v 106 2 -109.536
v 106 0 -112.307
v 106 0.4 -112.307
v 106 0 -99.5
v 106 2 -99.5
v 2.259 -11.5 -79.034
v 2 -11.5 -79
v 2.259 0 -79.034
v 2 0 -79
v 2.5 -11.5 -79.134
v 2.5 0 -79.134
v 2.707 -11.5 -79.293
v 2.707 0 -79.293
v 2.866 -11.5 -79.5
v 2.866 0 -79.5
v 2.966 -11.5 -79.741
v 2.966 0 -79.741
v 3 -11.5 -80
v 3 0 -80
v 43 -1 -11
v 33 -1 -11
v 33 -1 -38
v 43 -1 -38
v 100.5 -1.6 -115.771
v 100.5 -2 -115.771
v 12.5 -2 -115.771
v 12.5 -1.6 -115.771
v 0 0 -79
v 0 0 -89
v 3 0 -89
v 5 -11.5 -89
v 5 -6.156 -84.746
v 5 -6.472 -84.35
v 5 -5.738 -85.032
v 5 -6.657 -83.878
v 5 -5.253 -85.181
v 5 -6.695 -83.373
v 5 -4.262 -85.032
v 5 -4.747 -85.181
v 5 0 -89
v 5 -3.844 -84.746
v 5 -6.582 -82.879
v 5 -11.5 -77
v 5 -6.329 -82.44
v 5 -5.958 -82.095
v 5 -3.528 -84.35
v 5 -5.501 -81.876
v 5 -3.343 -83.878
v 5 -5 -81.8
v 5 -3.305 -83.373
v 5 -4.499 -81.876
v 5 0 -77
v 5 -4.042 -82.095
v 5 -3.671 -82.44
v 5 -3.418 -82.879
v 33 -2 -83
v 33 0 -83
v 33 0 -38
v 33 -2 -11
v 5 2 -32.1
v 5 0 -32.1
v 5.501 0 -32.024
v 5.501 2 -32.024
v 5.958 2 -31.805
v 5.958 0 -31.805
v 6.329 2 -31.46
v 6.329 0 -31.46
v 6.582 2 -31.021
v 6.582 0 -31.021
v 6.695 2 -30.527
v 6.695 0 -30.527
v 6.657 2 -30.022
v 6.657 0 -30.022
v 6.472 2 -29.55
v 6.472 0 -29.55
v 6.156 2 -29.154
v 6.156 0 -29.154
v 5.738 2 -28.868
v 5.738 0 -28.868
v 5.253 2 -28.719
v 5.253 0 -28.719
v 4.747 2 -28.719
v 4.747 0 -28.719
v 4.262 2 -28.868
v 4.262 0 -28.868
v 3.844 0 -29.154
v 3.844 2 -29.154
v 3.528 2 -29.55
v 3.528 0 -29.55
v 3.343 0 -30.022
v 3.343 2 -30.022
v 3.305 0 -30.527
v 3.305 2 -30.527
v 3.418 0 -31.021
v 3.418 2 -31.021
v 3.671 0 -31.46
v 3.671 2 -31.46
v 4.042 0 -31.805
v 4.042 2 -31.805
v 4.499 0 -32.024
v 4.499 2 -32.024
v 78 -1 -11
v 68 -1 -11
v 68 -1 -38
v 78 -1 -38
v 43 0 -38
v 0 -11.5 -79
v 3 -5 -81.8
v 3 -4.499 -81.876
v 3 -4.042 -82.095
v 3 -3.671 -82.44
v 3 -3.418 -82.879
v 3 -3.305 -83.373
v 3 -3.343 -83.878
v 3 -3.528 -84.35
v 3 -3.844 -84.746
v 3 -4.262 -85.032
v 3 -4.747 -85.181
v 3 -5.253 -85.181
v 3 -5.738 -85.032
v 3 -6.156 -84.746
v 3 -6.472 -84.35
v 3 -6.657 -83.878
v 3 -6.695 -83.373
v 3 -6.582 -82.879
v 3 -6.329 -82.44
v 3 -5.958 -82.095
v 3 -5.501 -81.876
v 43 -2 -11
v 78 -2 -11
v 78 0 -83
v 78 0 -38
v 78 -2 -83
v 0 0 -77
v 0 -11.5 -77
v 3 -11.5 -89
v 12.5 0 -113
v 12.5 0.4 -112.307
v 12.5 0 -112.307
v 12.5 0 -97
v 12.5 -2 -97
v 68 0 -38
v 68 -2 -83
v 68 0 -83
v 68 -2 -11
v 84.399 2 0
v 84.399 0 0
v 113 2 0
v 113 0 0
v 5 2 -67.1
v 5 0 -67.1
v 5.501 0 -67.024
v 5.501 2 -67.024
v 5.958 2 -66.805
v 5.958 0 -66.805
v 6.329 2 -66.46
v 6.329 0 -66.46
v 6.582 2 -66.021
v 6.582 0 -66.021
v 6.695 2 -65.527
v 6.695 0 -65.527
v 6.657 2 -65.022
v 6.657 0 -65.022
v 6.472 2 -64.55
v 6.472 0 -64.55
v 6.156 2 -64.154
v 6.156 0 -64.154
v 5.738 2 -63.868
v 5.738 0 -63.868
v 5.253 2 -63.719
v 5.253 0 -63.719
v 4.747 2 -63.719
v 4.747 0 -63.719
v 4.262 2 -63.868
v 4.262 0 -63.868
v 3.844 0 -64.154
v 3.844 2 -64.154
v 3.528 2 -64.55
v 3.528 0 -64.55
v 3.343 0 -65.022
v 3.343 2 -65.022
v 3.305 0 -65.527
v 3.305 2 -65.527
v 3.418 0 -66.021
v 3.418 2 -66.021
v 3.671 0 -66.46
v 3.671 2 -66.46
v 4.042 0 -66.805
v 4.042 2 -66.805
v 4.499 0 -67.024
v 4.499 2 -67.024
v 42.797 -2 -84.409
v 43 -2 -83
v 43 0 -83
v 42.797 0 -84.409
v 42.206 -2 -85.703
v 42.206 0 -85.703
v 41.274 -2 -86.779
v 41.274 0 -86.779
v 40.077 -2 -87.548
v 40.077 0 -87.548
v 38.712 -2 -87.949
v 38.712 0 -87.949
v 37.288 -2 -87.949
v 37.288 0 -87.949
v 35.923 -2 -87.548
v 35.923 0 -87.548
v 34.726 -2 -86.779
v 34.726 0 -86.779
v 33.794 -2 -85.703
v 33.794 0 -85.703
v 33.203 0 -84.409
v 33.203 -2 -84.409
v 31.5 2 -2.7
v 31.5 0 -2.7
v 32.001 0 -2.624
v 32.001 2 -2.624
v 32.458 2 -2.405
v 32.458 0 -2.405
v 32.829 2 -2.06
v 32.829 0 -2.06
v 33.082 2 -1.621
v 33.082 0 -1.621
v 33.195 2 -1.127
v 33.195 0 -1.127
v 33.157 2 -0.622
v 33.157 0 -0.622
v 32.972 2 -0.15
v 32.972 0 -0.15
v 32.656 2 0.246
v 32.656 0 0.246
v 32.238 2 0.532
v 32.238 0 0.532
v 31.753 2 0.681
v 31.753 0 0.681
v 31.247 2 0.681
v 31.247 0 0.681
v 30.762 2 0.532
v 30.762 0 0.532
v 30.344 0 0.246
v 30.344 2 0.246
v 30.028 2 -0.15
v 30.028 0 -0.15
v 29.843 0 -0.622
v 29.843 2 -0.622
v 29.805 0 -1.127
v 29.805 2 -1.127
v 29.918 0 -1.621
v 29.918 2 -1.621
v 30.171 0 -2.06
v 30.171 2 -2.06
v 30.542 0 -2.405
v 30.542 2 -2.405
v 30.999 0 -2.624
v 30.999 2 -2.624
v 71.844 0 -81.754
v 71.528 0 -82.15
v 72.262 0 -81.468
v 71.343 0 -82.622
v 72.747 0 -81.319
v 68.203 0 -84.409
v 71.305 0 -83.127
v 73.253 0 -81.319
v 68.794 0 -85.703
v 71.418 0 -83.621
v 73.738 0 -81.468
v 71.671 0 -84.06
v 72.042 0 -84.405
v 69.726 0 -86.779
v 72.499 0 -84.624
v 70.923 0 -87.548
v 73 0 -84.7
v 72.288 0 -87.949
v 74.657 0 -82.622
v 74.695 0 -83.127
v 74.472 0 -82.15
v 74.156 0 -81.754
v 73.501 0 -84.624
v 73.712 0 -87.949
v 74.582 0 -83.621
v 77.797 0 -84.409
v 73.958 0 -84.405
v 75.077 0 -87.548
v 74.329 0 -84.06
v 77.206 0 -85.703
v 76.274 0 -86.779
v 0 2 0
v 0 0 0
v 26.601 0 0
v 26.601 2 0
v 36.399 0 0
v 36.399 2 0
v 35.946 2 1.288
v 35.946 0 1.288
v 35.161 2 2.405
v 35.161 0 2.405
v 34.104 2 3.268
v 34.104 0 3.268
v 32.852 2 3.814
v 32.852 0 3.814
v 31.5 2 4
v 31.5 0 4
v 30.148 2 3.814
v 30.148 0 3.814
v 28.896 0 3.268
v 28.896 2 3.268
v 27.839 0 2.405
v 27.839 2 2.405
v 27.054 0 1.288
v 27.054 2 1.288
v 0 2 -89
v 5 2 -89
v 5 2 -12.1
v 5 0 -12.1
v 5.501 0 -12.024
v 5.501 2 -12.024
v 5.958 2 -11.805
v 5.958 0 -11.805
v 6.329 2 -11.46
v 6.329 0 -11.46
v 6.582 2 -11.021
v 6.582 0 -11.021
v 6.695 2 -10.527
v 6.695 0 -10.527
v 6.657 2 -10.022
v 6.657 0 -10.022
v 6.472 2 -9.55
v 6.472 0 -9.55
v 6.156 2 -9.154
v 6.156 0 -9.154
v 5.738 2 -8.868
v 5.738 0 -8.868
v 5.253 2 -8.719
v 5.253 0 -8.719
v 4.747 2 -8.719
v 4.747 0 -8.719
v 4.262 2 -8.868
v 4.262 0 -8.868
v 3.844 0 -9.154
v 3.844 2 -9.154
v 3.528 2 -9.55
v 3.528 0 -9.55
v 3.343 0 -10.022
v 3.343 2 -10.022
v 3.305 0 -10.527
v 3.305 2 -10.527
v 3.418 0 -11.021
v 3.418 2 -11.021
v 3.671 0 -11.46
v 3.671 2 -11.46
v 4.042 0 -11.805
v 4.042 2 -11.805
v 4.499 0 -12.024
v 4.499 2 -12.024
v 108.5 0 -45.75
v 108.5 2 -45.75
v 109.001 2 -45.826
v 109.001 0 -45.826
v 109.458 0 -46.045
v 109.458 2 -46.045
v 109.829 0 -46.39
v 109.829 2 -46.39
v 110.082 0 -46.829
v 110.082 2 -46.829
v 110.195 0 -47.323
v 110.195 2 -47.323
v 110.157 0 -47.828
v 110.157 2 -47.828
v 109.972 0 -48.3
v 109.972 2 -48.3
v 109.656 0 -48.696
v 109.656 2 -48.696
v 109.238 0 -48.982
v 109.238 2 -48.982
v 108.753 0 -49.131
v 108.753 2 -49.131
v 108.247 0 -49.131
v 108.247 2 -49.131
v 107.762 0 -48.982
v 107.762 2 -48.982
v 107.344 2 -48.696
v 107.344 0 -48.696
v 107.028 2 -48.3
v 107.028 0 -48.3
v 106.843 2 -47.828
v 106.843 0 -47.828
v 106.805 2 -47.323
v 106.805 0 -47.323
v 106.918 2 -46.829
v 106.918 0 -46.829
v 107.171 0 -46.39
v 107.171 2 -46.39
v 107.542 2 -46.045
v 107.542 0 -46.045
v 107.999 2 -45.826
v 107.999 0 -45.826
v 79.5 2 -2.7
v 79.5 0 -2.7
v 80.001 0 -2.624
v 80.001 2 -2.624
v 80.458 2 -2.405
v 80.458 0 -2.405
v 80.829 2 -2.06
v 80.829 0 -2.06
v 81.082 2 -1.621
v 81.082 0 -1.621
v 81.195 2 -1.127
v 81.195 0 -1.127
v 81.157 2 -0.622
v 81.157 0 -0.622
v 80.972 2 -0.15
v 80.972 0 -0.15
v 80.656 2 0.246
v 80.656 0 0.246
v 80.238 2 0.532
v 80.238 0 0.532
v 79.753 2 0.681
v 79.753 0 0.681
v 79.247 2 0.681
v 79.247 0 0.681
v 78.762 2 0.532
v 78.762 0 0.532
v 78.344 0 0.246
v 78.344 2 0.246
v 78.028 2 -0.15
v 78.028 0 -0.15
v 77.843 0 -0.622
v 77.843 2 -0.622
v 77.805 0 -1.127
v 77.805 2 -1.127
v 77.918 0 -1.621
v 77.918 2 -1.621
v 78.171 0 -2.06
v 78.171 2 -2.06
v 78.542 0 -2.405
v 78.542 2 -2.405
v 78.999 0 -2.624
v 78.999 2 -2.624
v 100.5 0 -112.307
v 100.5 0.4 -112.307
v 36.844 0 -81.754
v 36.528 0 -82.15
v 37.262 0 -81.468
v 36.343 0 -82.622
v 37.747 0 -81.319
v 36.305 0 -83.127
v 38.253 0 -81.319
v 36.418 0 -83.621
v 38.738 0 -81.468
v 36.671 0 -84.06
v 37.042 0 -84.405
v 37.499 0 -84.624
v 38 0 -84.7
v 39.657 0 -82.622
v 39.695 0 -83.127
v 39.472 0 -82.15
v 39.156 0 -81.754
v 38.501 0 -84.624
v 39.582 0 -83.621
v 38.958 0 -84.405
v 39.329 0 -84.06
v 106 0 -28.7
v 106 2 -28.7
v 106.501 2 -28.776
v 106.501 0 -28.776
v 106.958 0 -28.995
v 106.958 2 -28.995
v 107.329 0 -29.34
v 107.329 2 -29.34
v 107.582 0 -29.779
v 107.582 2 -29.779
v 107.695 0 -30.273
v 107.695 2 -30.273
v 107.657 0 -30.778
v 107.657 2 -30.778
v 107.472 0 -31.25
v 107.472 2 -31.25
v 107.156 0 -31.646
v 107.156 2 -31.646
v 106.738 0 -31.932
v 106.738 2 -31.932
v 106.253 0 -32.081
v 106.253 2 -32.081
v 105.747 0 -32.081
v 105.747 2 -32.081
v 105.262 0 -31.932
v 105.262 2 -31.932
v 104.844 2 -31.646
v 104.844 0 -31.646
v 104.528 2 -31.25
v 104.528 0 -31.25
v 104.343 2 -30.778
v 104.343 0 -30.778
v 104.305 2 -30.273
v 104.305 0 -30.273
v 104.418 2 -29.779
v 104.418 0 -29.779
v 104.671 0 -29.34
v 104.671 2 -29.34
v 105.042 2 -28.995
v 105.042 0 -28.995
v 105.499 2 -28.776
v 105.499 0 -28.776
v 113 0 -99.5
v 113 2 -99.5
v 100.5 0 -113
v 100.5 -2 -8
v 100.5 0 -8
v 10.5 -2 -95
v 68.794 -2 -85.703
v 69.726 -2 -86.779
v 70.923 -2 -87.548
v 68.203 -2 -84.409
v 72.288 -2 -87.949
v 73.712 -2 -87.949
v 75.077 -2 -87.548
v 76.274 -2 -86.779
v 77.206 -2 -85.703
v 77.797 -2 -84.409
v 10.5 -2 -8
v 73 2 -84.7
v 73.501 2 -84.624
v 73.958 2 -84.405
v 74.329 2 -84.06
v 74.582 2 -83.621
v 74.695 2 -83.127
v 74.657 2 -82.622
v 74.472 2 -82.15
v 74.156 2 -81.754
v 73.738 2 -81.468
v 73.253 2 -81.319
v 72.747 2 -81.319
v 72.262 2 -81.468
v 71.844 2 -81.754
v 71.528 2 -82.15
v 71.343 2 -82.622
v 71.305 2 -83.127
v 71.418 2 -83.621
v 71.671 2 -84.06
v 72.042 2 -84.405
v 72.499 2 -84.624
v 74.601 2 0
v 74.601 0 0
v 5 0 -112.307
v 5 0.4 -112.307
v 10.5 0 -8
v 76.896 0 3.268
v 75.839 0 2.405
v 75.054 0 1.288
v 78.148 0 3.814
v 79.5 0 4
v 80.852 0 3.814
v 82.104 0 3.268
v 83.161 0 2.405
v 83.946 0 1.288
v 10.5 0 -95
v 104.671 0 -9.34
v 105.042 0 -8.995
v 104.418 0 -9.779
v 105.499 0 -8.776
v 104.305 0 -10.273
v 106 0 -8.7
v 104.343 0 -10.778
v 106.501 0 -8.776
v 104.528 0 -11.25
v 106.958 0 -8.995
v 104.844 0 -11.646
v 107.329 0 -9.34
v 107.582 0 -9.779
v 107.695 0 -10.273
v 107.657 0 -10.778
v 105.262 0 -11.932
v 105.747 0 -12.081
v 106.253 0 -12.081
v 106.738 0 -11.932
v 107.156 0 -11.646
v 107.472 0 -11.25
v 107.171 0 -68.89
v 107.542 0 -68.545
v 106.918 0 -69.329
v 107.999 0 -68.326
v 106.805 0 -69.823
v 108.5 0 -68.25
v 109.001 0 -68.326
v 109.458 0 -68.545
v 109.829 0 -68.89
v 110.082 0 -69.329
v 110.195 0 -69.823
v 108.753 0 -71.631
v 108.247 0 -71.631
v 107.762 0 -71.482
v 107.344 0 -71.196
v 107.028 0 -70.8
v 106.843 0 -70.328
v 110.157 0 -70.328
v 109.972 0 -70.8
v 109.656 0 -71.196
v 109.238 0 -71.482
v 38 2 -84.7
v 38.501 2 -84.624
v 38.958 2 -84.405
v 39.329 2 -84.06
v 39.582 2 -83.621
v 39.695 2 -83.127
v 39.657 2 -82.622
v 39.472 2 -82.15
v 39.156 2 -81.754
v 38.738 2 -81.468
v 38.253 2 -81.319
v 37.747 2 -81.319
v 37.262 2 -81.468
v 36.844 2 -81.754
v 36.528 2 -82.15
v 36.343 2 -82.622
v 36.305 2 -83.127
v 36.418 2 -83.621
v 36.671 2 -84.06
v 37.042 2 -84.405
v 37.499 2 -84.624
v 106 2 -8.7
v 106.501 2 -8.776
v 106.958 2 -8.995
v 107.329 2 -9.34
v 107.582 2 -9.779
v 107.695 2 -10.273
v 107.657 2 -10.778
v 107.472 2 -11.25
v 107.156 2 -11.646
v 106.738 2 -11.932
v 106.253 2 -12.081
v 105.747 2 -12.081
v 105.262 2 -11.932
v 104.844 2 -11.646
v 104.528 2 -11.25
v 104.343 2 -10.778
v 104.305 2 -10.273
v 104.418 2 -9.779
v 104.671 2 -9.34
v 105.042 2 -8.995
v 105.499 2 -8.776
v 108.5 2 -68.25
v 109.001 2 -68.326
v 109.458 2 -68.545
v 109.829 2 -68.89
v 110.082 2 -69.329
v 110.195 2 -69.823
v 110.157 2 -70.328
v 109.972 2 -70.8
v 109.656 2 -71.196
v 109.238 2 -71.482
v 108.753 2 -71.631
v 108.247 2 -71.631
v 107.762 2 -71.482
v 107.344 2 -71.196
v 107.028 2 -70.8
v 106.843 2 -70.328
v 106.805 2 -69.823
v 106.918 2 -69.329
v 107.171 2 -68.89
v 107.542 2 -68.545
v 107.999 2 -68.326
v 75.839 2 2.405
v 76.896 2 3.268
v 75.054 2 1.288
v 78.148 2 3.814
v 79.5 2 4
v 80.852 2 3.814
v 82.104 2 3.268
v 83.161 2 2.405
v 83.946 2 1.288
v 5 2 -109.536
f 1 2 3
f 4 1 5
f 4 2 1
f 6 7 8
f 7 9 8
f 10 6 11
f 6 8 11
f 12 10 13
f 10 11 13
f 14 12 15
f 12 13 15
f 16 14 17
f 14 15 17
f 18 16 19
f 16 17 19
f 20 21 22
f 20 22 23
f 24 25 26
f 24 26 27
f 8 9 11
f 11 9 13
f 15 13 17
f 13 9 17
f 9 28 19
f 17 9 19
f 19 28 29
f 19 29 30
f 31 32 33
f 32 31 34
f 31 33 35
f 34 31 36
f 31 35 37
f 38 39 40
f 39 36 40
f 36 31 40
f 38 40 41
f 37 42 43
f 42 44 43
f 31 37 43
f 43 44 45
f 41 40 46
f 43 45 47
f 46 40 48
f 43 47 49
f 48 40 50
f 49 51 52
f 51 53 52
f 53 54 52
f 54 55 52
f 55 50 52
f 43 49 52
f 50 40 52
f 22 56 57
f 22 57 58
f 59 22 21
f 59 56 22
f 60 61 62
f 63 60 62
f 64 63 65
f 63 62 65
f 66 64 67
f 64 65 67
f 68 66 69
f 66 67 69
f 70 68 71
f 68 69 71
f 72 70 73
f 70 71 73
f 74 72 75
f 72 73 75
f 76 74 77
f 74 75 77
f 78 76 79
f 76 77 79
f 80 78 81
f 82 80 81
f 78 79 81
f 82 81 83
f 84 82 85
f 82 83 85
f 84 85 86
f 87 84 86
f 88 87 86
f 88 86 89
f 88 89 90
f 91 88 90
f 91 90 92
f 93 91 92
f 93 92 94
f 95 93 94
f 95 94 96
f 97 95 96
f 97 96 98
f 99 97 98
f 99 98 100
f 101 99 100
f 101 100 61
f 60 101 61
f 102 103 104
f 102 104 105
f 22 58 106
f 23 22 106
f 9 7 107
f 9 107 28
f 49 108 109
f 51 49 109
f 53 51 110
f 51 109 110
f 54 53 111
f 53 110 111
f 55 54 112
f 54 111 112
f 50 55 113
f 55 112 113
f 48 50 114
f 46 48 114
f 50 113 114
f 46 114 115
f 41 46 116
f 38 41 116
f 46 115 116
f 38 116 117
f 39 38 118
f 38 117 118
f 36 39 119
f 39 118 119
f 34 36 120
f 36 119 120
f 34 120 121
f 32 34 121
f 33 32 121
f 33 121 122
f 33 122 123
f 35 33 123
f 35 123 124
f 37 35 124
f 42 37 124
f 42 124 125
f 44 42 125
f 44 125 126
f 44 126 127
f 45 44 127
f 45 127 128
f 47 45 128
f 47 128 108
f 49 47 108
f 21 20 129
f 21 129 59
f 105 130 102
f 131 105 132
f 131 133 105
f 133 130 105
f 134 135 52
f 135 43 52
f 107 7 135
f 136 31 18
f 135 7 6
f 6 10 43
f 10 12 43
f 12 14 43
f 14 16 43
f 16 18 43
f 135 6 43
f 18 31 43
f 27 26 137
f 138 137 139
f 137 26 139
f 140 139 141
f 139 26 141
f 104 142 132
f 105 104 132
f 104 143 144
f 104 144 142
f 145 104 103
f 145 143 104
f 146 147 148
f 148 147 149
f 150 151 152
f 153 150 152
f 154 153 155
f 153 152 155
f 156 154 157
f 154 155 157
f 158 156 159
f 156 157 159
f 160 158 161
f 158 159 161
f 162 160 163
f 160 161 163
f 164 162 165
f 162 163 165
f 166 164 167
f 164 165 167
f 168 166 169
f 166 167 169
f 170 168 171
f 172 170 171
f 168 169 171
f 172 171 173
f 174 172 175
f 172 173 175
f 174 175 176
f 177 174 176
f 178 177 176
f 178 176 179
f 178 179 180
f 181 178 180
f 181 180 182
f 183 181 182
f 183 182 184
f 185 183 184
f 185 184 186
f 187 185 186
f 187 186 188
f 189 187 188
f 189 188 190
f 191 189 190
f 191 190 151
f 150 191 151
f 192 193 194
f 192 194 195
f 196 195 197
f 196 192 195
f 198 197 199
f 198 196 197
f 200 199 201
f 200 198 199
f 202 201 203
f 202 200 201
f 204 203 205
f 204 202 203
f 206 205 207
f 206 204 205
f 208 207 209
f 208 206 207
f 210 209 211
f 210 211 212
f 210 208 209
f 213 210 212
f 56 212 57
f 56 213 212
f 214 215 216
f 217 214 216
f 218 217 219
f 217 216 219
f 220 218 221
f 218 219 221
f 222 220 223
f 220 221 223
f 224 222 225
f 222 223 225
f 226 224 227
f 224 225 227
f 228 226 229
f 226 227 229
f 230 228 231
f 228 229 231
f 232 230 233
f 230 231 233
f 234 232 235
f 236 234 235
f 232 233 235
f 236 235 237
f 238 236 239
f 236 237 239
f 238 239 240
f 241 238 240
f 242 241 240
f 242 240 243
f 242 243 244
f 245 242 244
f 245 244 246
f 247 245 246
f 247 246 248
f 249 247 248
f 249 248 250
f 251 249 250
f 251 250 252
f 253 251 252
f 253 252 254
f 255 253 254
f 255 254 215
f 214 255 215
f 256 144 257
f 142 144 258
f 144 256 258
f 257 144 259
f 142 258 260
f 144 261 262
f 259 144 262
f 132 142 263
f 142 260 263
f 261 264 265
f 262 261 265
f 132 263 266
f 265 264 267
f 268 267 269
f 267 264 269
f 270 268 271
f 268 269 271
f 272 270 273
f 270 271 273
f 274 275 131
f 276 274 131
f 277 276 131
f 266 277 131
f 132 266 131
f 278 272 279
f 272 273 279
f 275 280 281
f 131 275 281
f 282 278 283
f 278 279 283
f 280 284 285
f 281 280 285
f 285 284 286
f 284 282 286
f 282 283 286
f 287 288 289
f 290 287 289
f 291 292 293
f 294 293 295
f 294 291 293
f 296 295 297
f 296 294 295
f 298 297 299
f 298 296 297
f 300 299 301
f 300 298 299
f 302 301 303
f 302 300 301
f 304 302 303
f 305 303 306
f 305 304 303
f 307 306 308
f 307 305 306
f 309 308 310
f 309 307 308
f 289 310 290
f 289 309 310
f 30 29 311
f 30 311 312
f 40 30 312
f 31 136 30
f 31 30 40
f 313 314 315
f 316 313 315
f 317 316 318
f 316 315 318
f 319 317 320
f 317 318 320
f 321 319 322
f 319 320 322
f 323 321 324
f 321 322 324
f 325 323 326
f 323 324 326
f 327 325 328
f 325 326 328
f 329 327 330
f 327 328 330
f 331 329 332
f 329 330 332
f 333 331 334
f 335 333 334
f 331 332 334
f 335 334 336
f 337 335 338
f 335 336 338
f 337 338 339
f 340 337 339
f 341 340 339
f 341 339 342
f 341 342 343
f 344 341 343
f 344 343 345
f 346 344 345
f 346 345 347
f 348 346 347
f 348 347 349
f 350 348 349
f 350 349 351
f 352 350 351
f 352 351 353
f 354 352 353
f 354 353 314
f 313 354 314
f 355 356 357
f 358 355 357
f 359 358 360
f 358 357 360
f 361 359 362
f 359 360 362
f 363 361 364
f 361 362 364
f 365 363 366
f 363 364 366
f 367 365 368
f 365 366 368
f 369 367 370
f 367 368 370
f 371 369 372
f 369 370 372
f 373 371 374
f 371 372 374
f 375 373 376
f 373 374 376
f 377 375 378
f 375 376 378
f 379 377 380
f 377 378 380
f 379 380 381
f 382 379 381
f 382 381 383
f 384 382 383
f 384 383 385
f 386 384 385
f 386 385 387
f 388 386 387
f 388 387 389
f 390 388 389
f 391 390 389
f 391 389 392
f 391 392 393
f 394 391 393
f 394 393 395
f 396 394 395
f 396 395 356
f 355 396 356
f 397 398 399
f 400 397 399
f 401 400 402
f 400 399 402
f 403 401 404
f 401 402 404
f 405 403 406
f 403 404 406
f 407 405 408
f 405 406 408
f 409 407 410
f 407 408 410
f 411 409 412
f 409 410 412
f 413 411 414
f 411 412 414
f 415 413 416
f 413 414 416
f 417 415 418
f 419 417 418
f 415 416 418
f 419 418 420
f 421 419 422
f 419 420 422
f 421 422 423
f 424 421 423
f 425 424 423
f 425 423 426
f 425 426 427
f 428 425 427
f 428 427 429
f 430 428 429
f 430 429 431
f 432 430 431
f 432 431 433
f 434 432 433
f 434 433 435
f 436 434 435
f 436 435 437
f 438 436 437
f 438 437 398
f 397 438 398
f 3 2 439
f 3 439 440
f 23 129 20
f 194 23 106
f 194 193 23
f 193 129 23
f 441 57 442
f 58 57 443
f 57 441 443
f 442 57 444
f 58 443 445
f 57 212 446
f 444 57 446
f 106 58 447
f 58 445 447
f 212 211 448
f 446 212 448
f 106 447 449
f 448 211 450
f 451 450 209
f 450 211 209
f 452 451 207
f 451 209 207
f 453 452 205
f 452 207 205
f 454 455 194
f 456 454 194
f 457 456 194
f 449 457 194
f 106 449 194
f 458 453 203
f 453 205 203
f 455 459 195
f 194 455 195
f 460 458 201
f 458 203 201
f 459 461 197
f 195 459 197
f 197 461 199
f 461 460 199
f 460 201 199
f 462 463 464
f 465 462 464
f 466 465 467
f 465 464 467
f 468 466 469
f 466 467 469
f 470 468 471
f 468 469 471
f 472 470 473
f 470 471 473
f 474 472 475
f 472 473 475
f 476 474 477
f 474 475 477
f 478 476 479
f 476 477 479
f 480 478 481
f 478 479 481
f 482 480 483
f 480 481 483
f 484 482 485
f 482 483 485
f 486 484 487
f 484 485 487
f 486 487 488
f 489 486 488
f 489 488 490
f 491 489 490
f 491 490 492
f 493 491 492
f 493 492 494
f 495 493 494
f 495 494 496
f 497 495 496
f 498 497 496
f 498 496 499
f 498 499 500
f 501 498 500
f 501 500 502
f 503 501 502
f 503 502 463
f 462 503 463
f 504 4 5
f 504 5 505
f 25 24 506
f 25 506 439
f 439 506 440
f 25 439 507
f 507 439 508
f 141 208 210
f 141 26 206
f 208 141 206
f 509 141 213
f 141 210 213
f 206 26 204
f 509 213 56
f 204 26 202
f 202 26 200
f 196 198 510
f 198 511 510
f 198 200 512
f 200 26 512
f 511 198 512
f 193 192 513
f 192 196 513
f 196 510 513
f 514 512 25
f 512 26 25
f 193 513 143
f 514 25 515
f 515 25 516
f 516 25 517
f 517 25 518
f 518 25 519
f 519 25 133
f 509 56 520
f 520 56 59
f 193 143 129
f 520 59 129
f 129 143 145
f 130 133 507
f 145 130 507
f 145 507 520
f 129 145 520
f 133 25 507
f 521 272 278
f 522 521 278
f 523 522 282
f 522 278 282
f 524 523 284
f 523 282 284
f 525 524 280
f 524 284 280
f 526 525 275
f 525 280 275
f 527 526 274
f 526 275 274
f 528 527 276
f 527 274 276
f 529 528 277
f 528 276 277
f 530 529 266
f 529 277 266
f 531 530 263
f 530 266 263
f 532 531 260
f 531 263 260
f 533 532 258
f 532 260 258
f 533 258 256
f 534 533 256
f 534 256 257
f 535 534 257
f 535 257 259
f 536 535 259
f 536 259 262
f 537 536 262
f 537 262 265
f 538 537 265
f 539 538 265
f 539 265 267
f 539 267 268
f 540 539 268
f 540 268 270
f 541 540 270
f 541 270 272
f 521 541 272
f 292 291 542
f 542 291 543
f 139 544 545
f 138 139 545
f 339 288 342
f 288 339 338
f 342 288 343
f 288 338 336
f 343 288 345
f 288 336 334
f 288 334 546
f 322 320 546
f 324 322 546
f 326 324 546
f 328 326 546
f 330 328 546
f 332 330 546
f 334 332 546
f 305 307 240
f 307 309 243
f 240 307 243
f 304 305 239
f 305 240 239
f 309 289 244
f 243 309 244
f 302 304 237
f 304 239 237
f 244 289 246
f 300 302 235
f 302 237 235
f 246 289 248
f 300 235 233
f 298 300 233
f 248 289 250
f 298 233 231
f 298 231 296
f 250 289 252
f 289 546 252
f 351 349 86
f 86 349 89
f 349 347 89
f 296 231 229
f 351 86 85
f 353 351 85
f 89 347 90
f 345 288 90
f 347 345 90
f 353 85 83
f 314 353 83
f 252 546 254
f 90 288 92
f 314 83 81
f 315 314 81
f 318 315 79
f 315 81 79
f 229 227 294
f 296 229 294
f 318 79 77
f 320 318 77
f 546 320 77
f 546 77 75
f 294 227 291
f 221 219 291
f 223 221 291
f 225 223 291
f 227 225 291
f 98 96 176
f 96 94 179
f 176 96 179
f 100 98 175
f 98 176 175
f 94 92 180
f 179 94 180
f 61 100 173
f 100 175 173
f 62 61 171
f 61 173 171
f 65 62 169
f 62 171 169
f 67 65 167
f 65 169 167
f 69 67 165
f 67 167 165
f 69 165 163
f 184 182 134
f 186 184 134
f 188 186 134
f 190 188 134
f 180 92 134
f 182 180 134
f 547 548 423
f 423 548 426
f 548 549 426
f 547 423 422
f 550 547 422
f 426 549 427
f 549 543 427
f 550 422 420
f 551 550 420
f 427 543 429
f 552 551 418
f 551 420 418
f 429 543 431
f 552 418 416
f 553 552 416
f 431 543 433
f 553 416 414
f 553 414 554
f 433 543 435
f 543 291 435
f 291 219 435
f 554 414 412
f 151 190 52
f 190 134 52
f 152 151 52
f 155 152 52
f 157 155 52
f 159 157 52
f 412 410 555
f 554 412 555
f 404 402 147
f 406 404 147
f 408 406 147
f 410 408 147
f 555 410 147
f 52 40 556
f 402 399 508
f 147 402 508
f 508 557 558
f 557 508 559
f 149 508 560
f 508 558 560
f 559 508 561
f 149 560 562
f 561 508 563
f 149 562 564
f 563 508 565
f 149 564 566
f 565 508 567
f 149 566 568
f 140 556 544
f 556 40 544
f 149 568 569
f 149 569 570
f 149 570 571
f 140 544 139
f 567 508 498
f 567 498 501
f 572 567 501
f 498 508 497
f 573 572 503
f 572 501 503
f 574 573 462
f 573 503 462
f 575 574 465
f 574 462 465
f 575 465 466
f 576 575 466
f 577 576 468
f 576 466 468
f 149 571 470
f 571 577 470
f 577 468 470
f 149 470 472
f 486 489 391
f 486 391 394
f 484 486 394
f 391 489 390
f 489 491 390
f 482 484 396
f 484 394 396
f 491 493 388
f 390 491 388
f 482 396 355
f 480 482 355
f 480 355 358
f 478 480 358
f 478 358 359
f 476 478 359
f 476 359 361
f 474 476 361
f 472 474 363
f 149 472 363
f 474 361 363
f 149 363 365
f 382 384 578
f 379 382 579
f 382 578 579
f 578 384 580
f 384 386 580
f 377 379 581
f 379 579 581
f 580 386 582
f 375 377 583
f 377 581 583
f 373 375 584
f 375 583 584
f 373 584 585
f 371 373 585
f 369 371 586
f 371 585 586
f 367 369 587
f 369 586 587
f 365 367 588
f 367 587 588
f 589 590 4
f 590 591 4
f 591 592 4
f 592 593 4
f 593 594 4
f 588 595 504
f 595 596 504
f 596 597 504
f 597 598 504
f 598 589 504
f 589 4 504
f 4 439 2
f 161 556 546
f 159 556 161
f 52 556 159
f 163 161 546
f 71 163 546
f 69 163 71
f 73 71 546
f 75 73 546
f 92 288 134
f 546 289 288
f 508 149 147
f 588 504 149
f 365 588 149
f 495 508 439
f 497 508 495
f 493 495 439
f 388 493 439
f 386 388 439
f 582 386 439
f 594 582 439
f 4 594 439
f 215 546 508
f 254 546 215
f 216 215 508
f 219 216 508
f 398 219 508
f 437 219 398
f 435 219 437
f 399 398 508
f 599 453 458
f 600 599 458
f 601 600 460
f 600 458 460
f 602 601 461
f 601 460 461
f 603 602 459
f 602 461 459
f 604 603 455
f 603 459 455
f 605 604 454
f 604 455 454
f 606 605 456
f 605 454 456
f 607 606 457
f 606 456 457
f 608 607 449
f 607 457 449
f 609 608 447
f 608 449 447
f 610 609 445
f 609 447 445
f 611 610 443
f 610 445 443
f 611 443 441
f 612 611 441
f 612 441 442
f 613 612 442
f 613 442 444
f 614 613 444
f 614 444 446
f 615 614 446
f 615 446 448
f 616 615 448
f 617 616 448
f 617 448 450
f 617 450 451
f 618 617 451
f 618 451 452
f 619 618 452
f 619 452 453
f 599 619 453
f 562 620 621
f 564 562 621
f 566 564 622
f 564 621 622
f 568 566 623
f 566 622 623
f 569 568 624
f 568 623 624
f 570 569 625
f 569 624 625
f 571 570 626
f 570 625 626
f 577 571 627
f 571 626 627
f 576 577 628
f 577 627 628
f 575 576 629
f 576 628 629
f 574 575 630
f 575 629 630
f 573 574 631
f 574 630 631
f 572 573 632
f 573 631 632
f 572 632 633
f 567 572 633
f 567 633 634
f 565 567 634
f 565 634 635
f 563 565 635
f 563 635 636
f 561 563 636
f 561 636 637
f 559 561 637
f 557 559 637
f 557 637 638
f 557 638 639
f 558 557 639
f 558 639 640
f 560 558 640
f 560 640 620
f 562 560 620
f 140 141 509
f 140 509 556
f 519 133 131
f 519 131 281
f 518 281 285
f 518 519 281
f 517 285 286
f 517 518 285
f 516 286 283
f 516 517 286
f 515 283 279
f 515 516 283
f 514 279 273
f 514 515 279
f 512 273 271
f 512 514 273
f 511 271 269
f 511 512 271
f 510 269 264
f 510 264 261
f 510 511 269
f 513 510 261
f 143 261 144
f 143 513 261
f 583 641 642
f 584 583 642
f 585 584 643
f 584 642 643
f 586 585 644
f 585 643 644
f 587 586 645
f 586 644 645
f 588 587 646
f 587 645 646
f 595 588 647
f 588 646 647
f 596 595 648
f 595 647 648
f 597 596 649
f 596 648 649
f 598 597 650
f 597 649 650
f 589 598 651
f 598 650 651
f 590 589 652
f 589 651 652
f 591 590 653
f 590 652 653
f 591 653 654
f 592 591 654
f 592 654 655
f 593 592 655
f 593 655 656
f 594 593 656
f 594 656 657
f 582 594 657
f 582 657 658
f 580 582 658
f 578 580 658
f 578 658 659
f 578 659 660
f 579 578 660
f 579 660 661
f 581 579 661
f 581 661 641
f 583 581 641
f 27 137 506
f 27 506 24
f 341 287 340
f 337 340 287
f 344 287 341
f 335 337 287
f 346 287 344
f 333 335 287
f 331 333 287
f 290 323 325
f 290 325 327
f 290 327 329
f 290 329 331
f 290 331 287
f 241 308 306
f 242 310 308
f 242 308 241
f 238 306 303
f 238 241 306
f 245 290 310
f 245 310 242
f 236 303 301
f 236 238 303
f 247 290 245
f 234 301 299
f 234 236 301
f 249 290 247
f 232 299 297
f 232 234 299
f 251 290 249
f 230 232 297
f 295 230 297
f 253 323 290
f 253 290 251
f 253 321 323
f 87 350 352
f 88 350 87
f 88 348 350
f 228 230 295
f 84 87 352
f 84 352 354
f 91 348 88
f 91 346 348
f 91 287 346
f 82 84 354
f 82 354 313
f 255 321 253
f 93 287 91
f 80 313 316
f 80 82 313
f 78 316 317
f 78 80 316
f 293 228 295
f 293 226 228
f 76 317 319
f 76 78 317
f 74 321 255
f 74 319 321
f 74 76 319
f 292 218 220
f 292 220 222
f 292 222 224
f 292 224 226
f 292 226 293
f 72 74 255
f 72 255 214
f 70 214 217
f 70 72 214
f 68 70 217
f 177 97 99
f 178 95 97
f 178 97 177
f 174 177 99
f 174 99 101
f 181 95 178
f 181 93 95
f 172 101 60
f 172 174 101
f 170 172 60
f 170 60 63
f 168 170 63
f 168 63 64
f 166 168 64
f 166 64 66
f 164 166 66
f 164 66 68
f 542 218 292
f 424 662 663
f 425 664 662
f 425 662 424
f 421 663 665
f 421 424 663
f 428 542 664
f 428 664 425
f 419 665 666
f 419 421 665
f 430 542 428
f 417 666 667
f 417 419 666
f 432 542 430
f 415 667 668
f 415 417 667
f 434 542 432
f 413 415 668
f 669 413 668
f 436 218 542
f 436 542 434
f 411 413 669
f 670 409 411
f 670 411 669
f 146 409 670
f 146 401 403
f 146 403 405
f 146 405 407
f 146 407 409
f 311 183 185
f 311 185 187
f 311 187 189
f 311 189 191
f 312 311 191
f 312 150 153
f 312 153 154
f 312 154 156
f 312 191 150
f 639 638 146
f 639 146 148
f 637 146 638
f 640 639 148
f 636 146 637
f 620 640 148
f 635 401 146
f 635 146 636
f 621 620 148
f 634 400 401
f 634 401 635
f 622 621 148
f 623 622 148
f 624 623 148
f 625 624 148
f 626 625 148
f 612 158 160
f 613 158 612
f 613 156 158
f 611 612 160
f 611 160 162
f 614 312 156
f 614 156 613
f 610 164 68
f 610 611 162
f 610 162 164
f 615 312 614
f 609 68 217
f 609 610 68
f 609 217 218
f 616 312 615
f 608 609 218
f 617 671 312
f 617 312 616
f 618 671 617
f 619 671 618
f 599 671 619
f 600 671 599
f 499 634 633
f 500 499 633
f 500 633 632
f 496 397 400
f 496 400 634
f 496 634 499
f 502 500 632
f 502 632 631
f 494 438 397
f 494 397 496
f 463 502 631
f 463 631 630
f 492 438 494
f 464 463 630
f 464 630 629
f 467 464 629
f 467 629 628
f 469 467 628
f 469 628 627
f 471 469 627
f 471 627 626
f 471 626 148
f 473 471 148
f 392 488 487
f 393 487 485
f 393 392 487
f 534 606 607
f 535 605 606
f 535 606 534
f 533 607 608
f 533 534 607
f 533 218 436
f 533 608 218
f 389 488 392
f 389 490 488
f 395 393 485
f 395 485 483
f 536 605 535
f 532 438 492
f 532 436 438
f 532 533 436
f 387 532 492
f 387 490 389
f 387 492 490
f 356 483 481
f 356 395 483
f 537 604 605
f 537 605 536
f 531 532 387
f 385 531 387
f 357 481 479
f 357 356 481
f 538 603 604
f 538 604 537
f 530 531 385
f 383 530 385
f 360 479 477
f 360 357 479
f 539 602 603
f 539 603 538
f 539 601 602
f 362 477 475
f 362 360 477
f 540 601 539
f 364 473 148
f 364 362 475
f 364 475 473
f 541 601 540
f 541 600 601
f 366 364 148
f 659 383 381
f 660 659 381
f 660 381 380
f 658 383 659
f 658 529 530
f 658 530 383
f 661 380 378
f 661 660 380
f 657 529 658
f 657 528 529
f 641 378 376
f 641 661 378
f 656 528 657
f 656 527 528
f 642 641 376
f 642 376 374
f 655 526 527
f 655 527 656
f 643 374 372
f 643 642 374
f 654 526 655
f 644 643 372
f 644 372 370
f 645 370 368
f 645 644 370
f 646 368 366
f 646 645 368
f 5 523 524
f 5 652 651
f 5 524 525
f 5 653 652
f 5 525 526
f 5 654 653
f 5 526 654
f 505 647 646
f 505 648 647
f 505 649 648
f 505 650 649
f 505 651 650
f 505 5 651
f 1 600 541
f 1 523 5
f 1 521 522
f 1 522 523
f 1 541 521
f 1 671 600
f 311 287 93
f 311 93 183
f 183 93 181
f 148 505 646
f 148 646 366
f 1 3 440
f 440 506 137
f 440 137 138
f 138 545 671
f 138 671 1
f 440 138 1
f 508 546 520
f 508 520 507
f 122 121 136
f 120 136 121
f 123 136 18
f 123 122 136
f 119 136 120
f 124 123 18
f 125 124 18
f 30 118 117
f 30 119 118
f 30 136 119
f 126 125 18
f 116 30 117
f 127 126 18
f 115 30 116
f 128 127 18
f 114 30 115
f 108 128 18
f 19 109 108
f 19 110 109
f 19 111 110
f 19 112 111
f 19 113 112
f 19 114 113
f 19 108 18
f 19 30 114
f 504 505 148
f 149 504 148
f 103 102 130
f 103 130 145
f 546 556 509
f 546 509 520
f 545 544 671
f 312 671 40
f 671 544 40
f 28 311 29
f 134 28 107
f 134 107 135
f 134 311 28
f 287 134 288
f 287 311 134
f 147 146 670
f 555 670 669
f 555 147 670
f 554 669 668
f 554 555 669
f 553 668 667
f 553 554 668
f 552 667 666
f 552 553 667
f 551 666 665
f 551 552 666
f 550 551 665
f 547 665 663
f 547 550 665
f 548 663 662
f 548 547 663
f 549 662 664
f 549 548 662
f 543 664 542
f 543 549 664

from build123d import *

# Parameters (mm, degrees)
SKETCH_1_W           = 113
SKETCH_1_H           = 113
EXTRUDE_1_DEPTH      = 3
CUT_EXTRUDE_1_REACH  = 161.834
SKETCH_2_R           = 1.7
SKETCH_3_W           = 90
SKETCH_3_H           = 105
EXTRUDE_2_DEPTH      = 2
SKETCH_5_R           = 5
EXTRUDE_3_DEPTH      = 3
CUT_EXTRUDE_2_REACH  = 161.834
SKETCH_6_R           = 1.7
CUT_EXTRUDE_3_REACH  = 161.834
SKETCH_7_R           = 1.7
CUT_EXTRUDE_4_REACH  = 161.884
SKETCH_8_R           = 1.7
EXTRUDE_5_DEPTH      = 90
CUT_EXTRUDE_5_DEPTH  = 2
SKETCH_13_W          = 2
SKETCH_13_H          = 12
EXTRUDE_6_DEPTH      = 11.5
CUT_EXTRUDE_6_REACH  = 162.612
SKETCH_14_R          = 1.7
CUT_EXTRUDE_7_REACH  = 164.681
EXTRUDE_7_DEPTH      = 8.5
SKETCH_17_W          = 2
SKETCH_17_H          = 11.5
EXTRUDE_8_DEPTH      = 3
FILLET_1_R           = 1
CUT_EXTRUDE_8_DEPTH  = 163.681089759
SKETCH_20_W          = 113
SKETCH_20_H          = 12.124355653
CUT_EXTRUDE_9_DEPTH  = 1
CHAMFER_1_SIZE       = 1
SKETCH_21_W          = 7
SKETCH_21_H          = 13.5
CUT_EXTRUDE_10_DEPTH = 163.681089759
SKETCH_22_W          = 5
SKETCH_22_H          = 24
CUT_EXTRUDE_11_DEPTH = 163.681089759
SKETCH_23_W          = 2
SKETCH_23_H          = 19.464101615
CUT_EXTRUDE_12_DEPTH = 2
CHAMFER_2_SIZE       = 2
SKETCH_24_W          = 0.692820323
SKETCH_24_H          = 0.4
CUT_EXTRUDE_13_DEPTH = 95.5
SKETCH_25_W          = 0.692820323
SKETCH_25_H          = 0.4
CUT_EXTRUDE_14_DEPTH = 5.5
SKETCH_26_W          = 0.692820323
SKETCH_26_H          = 0.4
CUT_EXTRUDE_15_DEPTH = 7.5
SKETCH_27_W          = 113
SKETCH_27_H          = 105.875644347
CUT_EXTRUDE_16_DEPTH = 163.339889035
SKETCH_29_W          = 10
SKETCH_29_H          = 5
CUT_EXTRUDE_17_DEPTH = 163.185818036
SKETCH_30_W          = 10
SKETCH_30_H          = 2
CUT_EXTRUDE_18_DEPTH = 37
SKETCH_31_W          = 10
SKETCH_31_H          = 27
EXTRUDE_9_DEPTH      = 1


with BuildPart() as part:
    # 草图1 → 凸台-拉伸1 (new body)
    with BuildSketch(Plane(origin=(0, 0, 0), x_dir=(1, 0, 0), z_dir=(0, 1, 0))):
        with Locations((56.5, 56.5)):
            Rectangle(SKETCH_1_W, SKETCH_1_H)
    extrude(amount=EXTRUDE_1_DEPTH)

    # 草图2 → 切除-拉伸1 (cut, up to next)
    with BuildSketch(Plane(origin=(0, 3, 0), x_dir=(1, 0, 0), z_dir=(0, 1, 0)), mode=Mode.PRIVATE) as cut_extrude_1_sk1:
        with Locations(Location((108.5, 69.95, 0), (0, 0, 270))):
            Circle(SKETCH_2_R)
    cut_extrude_1_tool1 = extrude(cut_extrude_1_sk1.sketch, amount=-CUT_EXTRUDE_1_REACH, mode=Mode.PRIVATE) & part.part
    # 草图2 → 切除-拉伸1 (cut, up to next)
    with BuildSketch(Plane(origin=(0, 3, 0), x_dir=(1, 0, 0), z_dir=(0, 1, 0)), mode=Mode.PRIVATE) as cut_extrude_1_sk2:
        with Locations(Location((108.5, 47.45, 0), (0, 0, 270))):
            Circle(SKETCH_2_R)
    cut_extrude_1_tool2 = extrude(cut_extrude_1_sk2.sketch, amount=-CUT_EXTRUDE_1_REACH, mode=Mode.PRIVATE) & part.part
    # 草图2 → 切除-拉伸1 (cut, up to next)
    with BuildSketch(Plane(origin=(0, 3, 0), x_dir=(1, 0, 0), z_dir=(0, 1, 0)), mode=Mode.PRIVATE) as cut_extrude_1_sk3:
        with Locations(Location((106, 30.4, 0), (0, 0, 270))):
            Circle(SKETCH_2_R)
    cut_extrude_1_tool3 = extrude(cut_extrude_1_sk3.sketch, amount=-CUT_EXTRUDE_1_REACH, mode=Mode.PRIVATE) & part.part
    # 草图2 → 切除-拉伸1 (cut, up to next)
    with BuildSketch(Plane(origin=(0, 3, 0), x_dir=(1, 0, 0), z_dir=(0, 1, 0)), mode=Mode.PRIVATE) as cut_extrude_1_sk4:
        with Locations(Location((106, 10.4, 0), (0, 0, 270))):
            Circle(SKETCH_2_R)
    cut_extrude_1_tool4 = extrude(cut_extrude_1_sk4.sketch, amount=-CUT_EXTRUDE_1_REACH, mode=Mode.PRIVATE) & part.part
    add(cut_extrude_1_tool1.solids().sort_by_distance((108.5, 3, -69.95))[0], mode=Mode.SUBTRACT)
    add(cut_extrude_1_tool2.solids().sort_by_distance((108.5, 3, -47.45))[0], mode=Mode.SUBTRACT)
    add(cut_extrude_1_tool3.solids().sort_by_distance((106, 3, -30.4))[0], mode=Mode.SUBTRACT)
    add(cut_extrude_1_tool4.solids().sort_by_distance((106, 3, -10.4))[0], mode=Mode.SUBTRACT)

    # 草图3 → 凸台-拉伸2 (add)
    with BuildSketch(Plane(origin=(0, 0, 0), x_dir=(1, 0, 0), z_dir=(0, 1, 0))):
        with Locations((55.5, 60.5)):
            Rectangle(SKETCH_3_W, SKETCH_3_H)
    extrude(amount=-EXTRUDE_2_DEPTH)

    # 草图5 → 凸台-拉伸3 (add)
    with BuildSketch(Plane.XZ):
        with Locations((79.5, -1)):
            Circle(SKETCH_5_R)
        with Locations((31.5, -1)):
            Circle(SKETCH_5_R)
    extrude(amount=-EXTRUDE_3_DEPTH)

    # 草图6 → 切除-拉伸2 (cut, up to next)
    with BuildSketch(Plane.XZ, mode=Mode.PRIVATE) as cut_extrude_2_sk1:
        with Locations(Location((31.5, -1, 0), (0, 0, 270))):
            Circle(SKETCH_6_R)
    cut_extrude_2_tool1 = extrude(cut_extrude_2_sk1.sketch, amount=-CUT_EXTRUDE_2_REACH, mode=Mode.PRIVATE) & part.part
    # 草图6 → 切除-拉伸2 (cut, up to next)
    with BuildSketch(Plane.XZ, mode=Mode.PRIVATE) as cut_extrude_2_sk2:
        with Locations(Location((79.5, -1, 0), (0, 0, 270))):
            Circle(SKETCH_6_R)
    cut_extrude_2_tool2 = extrude(cut_extrude_2_sk2.sketch, amount=-CUT_EXTRUDE_2_REACH, mode=Mode.PRIVATE) & part.part
    add(cut_extrude_2_tool1.solids().sort_by_distance((31.5, 0, -1))[0], mode=Mode.SUBTRACT)
    add(cut_extrude_2_tool2.solids().sort_by_distance((79.5, 0, -1))[0], mode=Mode.SUBTRACT)

    # 草图7 → 切除-拉伸3 (cut, up to next)
    with BuildSketch(Plane.XZ, mode=Mode.PRIVATE) as cut_extrude_3_sk1:
        with Locations(Location((5, -10.4, 0), (0, 0, 270))):
            Circle(SKETCH_7_R)
    cut_extrude_3_tool1 = extrude(cut_extrude_3_sk1.sketch, amount=-CUT_EXTRUDE_3_REACH, mode=Mode.PRIVATE) & part.part
    # 草图7 → 切除-拉伸3 (cut, up to next)
    with BuildSketch(Plane.XZ, mode=Mode.PRIVATE) as cut_extrude_3_sk2:
        with Locations(Location((5, -30.4, 0), (0, 0, 270))):
            Circle(SKETCH_7_R)
    cut_extrude_3_tool2 = extrude(cut_extrude_3_sk2.sketch, amount=-CUT_EXTRUDE_3_REACH, mode=Mode.PRIVATE) & part.part
    # 草图7 → 切除-拉伸3 (cut, up to next)
    with BuildSketch(Plane.XZ, mode=Mode.PRIVATE) as cut_extrude_3_sk3:
        with Locations(Location((5, -65.4, 0), (0, 0, 270))):
            Circle(SKETCH_7_R)
    cut_extrude_3_tool3 = extrude(cut_extrude_3_sk3.sketch, amount=-CUT_EXTRUDE_3_REACH, mode=Mode.PRIVATE) & part.part
    add(cut_extrude_3_tool1.solids().sort_by_distance((5, 0, -10.4))[0], mode=Mode.SUBTRACT)
    add(cut_extrude_3_tool2.solids().sort_by_distance((5, 0, -30.4))[0], mode=Mode.SUBTRACT)
    add(cut_extrude_3_tool3.solids().sort_by_distance((5, 0, -65.4))[0], mode=Mode.SUBTRACT)

    # 草图8 → 切除-拉伸4 (cut, up to next)
    with BuildSketch(Plane.XZ.offset(2), mode=Mode.PRIVATE) as cut_extrude_4_sk1:
        with Locations(Location((38, -83, 0), (0, 0, 270))):
            Circle(SKETCH_8_R)
    cut_extrude_4_tool1 = extrude(cut_extrude_4_sk1.sketch, amount=-CUT_EXTRUDE_4_REACH, mode=Mode.PRIVATE) & part.part
    # 草图8 → 切除-拉伸4 (cut, up to next)
    with BuildSketch(Plane.XZ.offset(2), mode=Mode.PRIVATE) as cut_extrude_4_sk2:
        with Locations(Location((73, -83, 0), (0, 0, 270))):
            Circle(SKETCH_8_R)
    cut_extrude_4_tool2 = extrude(cut_extrude_4_sk2.sketch, amount=-CUT_EXTRUDE_4_REACH, mode=Mode.PRIVATE) & part.part
    add(cut_extrude_4_tool1.solids().sort_by_distance((38, -2, -83))[0], mode=Mode.SUBTRACT)
    add(cut_extrude_4_tool2.solids().sort_by_distance((73, -2, -83))[0], mode=Mode.SUBTRACT)

    # 草图10 → 凸台-拉伸5 (add)
    with BuildSketch(Plane(origin=(100.5, 0, 0), x_dir=(0, 0, -1), z_dir=(1, 0, 0))):
        Polygon((113, 0), (116.464101615, -2), (113, -2), align=None)
    extrude(amount=-EXTRUDE_5_DEPTH)

    # 草图11 → 切除-拉伸5 (cut)
    with BuildSketch(Plane(origin=(0, -2, 0), x_dir=(1, 0, 0), z_dir=(0, 1, 0))):
        with BuildLine():
            Line((33, 83), (33, 53))
            ThreePointArc((33, 53), (38, 48), (43, 53))
            Line((43, 53), (43, 83))
            ThreePointArc((43, 83), (38, 88), (33, 83))
        make_face()
        with BuildLine():
            Line((68, 83), (68, 53))
            ThreePointArc((68, 53), (73, 48), (78, 53))
            Line((78, 53), (78, 83))
            ThreePointArc((78, 83), (73, 88), (68, 83))
        make_face()
    extrude(amount=CUT_EXTRUDE_5_DEPTH, mode=Mode.SUBTRACT)

    # 草图13 → 凸台-拉伸6 (add)
    with BuildSketch(Plane.XZ):
        with Locations((4, -83)):
            Rectangle(SKETCH_13_W, SKETCH_13_H)
    extrude(amount=EXTRUDE_6_DEPTH)

    # 草图14 → 切除-拉伸6 (cut, up to next)
    with BuildSketch(Plane.ZY.offset(-3), mode=Mode.PRIVATE) as cut_extrude_6_sk1:
        with Locations((-83.5, -5)):
            Circle(SKETCH_14_R)
    cut_extrude_6_tool1 = extrude(cut_extrude_6_sk1.sketch, amount=-CUT_EXTRUDE_6_REACH, mode=Mode.PRIVATE) & part.part
    add(cut_extrude_6_tool1.solids().sort_by_distance((3, -5, -83.5))[0], mode=Mode.SUBTRACT)

    # 草图15 → 切除-拉伸7 (cut, up to next)
    with BuildSketch(Plane.XZ, mode=Mode.PRIVATE) as cut_extrude_7_sk1:
        Polygon((113, -100.875644347), (106, -113), (113, -113), align=None)
    cut_extrude_7_tool1 = extrude(cut_extrude_7_sk1.sketch, amount=-CUT_EXTRUDE_7_REACH, mode=Mode.PRIVATE) & part.part
    add(cut_extrude_7_tool1.solids().sort_by_distance((110.666667, 0, -108.958548))[0], mode=Mode.SUBTRACT)

    # 草图16 → 凸台-拉伸7 (add)
    with BuildSketch(Plane.XZ):
        Polygon((113, -99.5), (107.5, -99.5), (107.5, -110.401923789), (113, -100.875644347), align=None)
    extrude(amount=EXTRUDE_7_DEPTH)

    # 草图17 → 凸台-拉伸8 (add)
    with BuildSketch(Plane.ZY.offset(-3)):
        with Locations((-78, -5.75)):
            Rectangle(SKETCH_17_W, SKETCH_17_H)
    extrude(amount=EXTRUDE_8_DEPTH)

    # 圆角1
    fillet_1_edges = [part.edges().sort_by_distance(p)[0] for p in [
        (3, -5.75, -79),
    ]]
    fillet(fillet_1_edges, radius=FILLET_1_R)

    # 草图19 → 切除-拉伸8 (cut, through all)
    with BuildSketch(Plane.ZY):
        Polygon((-113, 0), (-107.803847577, 3), (-113, 3), align=None)
    extrude(amount=-CUT_EXTRUDE_8_DEPTH, mode=Mode.SUBTRACT)

    # 草图20 → 切除-拉伸9 (cut)
    with BuildSketch(Plane(origin=(0, 3, 0), x_dir=(1, 0, 0), z_dir=(0, 1, 0))):
        with Locations((56.5, 106.937822173)):
            Rectangle(SKETCH_20_W, SKETCH_20_H)
    extrude(amount=-CUT_EXTRUDE_9_DEPTH, mode=Mode.SUBTRACT)

    # 倒角1
    chamfer_1_edges = [part.edges().sort_by_distance(p)[0] for p in [
        (56.5, 2, -100.875644347),
    ]]
    chamfer(chamfer_1_edges, length=CHAMFER_1_SIZE - 0.0001)  # a hair under: the kernel refuses the full size

    # 草图21 → 切除-拉伸10 (cut, through all)
    with BuildSketch(Plane.XZ.offset(8.5)):
        with Locations((109.5, -106.25)):
            Rectangle(SKETCH_21_W, SKETCH_21_H)
    extrude(amount=-CUT_EXTRUDE_10_DEPTH, mode=Mode.SUBTRACT)

    # 草图22 → 切除-拉伸11 (cut, through all)
    with BuildSketch(Plane.XZ):
        with Locations((2.5, -101)):
            Rectangle(SKETCH_22_W, SKETCH_22_H)
    extrude(amount=-CUT_EXTRUDE_11_DEPTH, mode=Mode.SUBTRACT)

    # 草图23 → 切除-拉伸12 (cut)
    with BuildSketch(Plane.XZ.offset(2)):
        with Locations((11.5, -106.732050808)):
            Rectangle(SKETCH_23_W, SKETCH_23_H)
    extrude(amount=-CUT_EXTRUDE_12_DEPTH, mode=Mode.SUBTRACT)

    # 倒角2
    chamfer_2_edges = [part.edges().sort_by_distance(p)[0] for p in [
        (10.5, -1, -97),
    ]]
    chamfer(chamfer_2_edges, length=CHAMFER_2_SIZE - 0.0001)  # a hair under: the kernel refuses the full size

    # 草图24 → 切除-拉伸13 (cut)
    with BuildSketch(Plane(origin=(100.5, 0, 0), x_dir=(0, 0, -1), z_dir=(1, 0, 0))):
        with Locations((116.117691454, -1.8)):
            Rectangle(SKETCH_24_W, SKETCH_24_H)
    extrude(amount=-CUT_EXTRUDE_13_DEPTH, mode=Mode.SUBTRACT)

    # 草图25 → 切除-拉伸14 (cut)
    with BuildSketch(Plane(origin=(106, 0, 0), x_dir=(0, 0, -1), z_dir=(1, 0, 0))):
        with Locations((112.653589839, 0.2)):
            Rectangle(SKETCH_25_W, SKETCH_25_H)
    extrude(amount=-CUT_EXTRUDE_14_DEPTH, mode=Mode.SUBTRACT)

    # 草图26 → 切除-拉伸15 (cut)
    with BuildSketch(Plane.ZY.offset(-5)):
        with Locations((-112.653589839, 0.2)):
            Rectangle(SKETCH_26_W, SKETCH_26_H)
    extrude(amount=-CUT_EXTRUDE_15_DEPTH, mode=Mode.SUBTRACT)

    # 草图27 → 切除-拉伸16 (cut, through all)
    with BuildSketch(Plane(origin=(0, 2, 0), x_dir=(1, 0, 0), z_dir=(0, 1, 0))):
        with Locations((56.5, 48.937822174)):
            Rectangle(SKETCH_27_W, SKETCH_27_H)
    extrude(amount=CUT_EXTRUDE_16_DEPTH, mode=Mode.SUBTRACT)

    # 草图29 → 切除-拉伸17 (cut, through all)
    with BuildSketch(Plane.XZ):
        with Locations((38, -50.5)):
            Rectangle(SKETCH_29_W, SKETCH_29_H)
        with Locations((73, -50.5)):
            Rectangle(SKETCH_29_W, SKETCH_29_H)
    extrude(amount=CUT_EXTRUDE_17_DEPTH, mode=Mode.SUBTRACT)

    # 草图30 → 切除-拉伸18 (cut)
    with BuildSketch(Plane(origin=(0, 0, -48), x_dir=(-1, 0, 0), z_dir=(0, 0, -1))):
        with Locations((-38, -1)):
            Rectangle(SKETCH_30_W, SKETCH_30_H)
        with Locations((-73, -1)):
            Rectangle(SKETCH_30_W, SKETCH_30_H)
    extrude(amount=-CUT_EXTRUDE_18_DEPTH, mode=Mode.SUBTRACT)

    # 草图31 → 凸台-拉伸9 (add)
    with BuildSketch(Plane.XZ):
        with Locations((38, -24.5)):
            Rectangle(SKETCH_31_W, SKETCH_31_H)
        with Locations((73, -24.5)):
            Rectangle(SKETCH_31_W, SKETCH_31_H)
    extrude(amount=EXTRUDE_9_DEPTH)


solid = part.part
